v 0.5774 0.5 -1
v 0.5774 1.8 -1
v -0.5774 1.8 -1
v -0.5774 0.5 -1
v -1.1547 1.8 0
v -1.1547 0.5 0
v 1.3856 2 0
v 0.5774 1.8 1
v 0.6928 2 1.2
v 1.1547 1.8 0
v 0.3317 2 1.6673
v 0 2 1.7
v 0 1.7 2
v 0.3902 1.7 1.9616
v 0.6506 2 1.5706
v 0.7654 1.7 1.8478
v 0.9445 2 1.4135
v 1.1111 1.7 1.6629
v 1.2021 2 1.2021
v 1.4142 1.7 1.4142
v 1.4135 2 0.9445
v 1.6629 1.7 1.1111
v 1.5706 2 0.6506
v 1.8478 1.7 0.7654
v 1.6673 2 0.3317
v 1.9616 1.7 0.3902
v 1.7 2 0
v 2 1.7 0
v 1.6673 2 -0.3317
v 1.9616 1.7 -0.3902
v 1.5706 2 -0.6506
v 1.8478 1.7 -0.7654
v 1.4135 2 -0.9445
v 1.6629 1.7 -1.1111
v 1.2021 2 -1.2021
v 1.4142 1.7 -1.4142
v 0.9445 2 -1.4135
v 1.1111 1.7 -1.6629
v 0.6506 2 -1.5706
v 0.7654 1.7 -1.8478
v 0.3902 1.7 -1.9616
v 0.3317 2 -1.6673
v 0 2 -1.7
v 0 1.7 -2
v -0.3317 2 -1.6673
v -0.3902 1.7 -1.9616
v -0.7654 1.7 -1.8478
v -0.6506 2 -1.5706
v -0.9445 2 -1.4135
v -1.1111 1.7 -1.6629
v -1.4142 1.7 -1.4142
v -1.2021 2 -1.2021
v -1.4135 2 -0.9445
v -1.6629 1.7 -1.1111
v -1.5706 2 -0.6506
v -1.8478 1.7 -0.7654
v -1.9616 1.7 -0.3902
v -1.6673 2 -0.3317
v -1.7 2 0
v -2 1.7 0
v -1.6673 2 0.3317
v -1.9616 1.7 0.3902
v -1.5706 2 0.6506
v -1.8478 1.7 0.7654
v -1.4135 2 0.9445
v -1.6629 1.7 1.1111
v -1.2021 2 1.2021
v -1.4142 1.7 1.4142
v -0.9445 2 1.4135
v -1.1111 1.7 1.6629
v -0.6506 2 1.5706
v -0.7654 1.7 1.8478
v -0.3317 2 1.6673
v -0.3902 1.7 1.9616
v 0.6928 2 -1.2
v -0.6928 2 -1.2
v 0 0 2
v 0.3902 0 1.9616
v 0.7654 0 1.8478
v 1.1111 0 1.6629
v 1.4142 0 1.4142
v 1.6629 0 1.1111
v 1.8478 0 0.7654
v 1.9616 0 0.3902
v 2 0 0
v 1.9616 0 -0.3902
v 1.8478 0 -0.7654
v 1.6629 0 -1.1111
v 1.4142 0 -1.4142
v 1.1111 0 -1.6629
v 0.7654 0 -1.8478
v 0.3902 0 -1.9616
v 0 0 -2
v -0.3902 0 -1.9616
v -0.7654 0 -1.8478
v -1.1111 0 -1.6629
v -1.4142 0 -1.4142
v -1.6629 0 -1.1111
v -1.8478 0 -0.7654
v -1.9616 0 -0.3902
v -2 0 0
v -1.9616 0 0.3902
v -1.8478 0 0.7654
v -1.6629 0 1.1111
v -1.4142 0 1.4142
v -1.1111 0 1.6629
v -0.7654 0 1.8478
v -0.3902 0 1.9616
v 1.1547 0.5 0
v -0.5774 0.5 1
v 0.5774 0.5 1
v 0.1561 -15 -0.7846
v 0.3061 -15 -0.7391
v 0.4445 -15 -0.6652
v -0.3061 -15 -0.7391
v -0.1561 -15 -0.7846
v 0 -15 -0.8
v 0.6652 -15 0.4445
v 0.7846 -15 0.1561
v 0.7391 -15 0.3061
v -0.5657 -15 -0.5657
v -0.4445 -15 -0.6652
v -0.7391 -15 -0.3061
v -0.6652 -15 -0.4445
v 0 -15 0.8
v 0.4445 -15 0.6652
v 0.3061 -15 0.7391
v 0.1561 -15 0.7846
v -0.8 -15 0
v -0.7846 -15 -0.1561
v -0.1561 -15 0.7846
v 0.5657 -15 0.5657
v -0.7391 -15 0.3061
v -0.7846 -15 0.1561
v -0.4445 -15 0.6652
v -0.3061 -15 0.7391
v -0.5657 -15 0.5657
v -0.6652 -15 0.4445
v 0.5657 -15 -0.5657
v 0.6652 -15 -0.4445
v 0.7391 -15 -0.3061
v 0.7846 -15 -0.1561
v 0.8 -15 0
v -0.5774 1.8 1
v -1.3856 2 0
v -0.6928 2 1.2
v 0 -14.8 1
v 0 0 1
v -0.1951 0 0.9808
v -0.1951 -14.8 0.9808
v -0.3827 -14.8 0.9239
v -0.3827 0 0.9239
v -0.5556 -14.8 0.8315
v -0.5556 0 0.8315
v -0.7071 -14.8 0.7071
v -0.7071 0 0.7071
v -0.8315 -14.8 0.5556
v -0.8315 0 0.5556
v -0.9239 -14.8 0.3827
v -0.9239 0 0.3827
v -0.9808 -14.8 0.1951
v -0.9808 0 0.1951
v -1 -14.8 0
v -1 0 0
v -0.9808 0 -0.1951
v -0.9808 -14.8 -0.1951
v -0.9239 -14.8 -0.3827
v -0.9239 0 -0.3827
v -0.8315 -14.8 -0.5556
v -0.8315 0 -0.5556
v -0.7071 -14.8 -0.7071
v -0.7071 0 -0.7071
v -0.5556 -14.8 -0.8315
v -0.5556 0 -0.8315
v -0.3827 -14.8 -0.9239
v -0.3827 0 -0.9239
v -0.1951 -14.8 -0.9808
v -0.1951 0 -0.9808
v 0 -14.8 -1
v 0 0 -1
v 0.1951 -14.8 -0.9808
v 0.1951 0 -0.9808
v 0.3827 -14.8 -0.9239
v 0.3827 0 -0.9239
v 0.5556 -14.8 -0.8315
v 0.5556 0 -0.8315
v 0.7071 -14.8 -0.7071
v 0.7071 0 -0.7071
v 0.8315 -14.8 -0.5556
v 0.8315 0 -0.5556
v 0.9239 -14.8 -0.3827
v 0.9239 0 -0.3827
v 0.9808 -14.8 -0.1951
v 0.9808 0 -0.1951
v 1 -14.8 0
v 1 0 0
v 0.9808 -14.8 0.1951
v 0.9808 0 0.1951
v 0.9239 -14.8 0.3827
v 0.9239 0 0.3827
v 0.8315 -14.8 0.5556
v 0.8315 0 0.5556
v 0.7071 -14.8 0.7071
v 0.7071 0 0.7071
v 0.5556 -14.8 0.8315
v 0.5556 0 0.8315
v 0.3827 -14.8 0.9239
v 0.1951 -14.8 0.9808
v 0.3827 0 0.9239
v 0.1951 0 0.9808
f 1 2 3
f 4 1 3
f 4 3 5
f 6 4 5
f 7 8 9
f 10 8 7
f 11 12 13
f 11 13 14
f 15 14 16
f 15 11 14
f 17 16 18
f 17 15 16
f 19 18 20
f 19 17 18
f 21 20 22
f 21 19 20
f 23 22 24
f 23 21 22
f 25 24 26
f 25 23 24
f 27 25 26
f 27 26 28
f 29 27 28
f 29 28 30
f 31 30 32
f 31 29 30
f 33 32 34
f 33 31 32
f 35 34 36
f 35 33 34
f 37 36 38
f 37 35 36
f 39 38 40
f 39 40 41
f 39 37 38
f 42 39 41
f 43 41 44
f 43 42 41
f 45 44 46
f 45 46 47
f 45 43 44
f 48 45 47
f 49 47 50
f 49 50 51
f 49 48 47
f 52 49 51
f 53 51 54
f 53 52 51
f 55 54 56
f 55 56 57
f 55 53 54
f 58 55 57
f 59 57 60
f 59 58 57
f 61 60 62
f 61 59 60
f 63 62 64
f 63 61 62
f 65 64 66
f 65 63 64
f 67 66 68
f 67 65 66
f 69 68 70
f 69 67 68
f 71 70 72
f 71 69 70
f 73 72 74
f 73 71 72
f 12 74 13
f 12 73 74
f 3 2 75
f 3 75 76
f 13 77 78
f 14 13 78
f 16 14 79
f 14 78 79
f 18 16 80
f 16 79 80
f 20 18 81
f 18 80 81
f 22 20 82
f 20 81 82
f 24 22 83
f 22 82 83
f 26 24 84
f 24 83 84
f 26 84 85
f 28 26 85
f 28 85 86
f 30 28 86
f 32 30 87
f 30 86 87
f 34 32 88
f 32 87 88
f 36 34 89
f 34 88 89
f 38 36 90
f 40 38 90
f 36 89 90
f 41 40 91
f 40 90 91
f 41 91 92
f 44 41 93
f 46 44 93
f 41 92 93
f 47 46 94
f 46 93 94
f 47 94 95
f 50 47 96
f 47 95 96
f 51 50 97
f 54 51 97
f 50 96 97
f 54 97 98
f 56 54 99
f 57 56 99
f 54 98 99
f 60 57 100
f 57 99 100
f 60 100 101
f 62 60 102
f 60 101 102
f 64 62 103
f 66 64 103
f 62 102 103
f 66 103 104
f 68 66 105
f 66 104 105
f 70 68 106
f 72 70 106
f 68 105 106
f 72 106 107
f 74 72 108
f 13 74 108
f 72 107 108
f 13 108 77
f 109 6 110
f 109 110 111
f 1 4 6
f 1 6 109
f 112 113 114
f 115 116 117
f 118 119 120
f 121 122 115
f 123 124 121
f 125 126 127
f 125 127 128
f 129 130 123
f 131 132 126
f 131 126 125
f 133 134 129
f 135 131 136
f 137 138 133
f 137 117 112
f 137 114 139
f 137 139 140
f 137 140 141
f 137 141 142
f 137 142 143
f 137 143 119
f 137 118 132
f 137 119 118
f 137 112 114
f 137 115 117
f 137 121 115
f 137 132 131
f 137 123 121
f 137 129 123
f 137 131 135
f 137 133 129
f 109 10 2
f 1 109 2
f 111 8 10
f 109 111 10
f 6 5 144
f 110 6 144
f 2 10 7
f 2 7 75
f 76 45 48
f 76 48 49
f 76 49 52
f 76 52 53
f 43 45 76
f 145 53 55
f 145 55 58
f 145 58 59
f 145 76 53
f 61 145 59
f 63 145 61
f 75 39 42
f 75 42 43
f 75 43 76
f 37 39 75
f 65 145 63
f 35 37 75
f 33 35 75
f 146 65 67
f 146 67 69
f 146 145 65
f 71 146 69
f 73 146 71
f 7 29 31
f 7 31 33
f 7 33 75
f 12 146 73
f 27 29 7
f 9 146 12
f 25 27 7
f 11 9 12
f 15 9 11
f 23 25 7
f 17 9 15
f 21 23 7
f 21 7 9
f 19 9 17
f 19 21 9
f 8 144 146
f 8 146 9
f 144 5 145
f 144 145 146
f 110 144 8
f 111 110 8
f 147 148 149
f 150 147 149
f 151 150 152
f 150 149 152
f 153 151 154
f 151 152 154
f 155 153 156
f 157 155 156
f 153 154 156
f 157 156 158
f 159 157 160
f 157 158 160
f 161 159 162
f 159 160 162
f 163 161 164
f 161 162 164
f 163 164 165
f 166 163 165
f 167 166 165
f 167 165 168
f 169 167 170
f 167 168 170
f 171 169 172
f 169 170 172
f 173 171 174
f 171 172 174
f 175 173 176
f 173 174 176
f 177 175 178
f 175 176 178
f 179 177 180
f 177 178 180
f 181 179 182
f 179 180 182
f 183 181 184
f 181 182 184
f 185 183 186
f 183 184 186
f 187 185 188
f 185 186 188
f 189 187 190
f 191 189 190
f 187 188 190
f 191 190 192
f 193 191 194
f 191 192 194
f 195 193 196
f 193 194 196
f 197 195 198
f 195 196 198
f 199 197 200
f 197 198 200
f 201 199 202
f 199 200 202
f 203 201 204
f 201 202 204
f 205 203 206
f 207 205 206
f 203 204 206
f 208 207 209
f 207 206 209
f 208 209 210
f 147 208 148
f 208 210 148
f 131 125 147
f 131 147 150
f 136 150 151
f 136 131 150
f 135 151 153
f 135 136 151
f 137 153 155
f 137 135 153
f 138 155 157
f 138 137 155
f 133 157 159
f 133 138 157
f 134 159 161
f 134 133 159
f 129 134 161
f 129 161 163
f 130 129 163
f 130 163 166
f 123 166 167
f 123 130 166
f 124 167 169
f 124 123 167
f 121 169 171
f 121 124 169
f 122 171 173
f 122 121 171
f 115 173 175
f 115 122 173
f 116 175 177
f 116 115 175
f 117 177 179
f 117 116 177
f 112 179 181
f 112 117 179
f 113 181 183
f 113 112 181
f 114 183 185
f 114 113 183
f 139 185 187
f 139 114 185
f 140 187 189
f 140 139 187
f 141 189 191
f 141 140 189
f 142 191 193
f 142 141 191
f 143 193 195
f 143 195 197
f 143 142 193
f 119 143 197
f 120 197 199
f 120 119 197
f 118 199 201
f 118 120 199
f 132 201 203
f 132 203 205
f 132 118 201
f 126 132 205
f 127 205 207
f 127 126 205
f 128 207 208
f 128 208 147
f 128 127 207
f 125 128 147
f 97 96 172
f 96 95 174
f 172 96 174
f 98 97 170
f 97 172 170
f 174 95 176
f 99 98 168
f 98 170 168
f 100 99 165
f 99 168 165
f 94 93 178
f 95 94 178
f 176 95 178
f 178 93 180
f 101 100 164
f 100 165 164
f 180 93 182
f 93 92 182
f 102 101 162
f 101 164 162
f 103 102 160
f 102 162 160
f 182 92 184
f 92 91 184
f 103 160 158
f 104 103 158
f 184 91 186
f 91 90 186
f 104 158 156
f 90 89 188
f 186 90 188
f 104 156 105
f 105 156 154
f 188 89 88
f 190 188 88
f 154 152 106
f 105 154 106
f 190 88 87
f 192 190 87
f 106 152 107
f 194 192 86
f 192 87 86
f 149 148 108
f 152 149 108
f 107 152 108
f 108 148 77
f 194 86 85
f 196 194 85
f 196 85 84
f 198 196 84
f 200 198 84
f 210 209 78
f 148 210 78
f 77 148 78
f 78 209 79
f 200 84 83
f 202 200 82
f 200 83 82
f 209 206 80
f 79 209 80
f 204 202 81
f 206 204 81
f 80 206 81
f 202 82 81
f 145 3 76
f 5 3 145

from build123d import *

# Parameters (mm, degrees)
SKETCH1_R           = 2
BOSS_EXTRUDE1_DEPTH = 2
CHAMFER1_SIZE       = 0.3
CUT_EXTRUDE1_DEPTH  = 1.5
CHAMFER2_SIZE       = 0.2
SKETCH3_R           = 1
BOSS_EXTRUDE2_DEPTH = 15
CHAMFER3_SIZE       = 0.2


with BuildPart() as part:
    # Sketch1 → Boss-Extrude1 (new body)
    with BuildSketch(Plane(origin=(0, 0, 0), x_dir=(1, 0, 0), z_dir=(0, 1, 0))):
        with Locations(Location((0, 0, 0), (0, 0, 270))):  # turned: the seam where the file's is
            Circle(SKETCH1_R)
    extrude(amount=BOSS_EXTRUDE1_DEPTH)

    # Chamfer1
    chamfer1_edges = [part.edges().sort_by_distance(p)[0] for p in [
        (0, 2, -2),
    ]]
    chamfer(chamfer1_edges, length=CHAMFER1_SIZE)

    # Sketch2 → Cut-Extrude1 (cut)
    with BuildSketch(Plane(origin=(0, 2, 0), x_dir=(1, 0, 0), z_dir=(0, 1, 0))):
        Polygon((1.154700538, 0), (0.577350269, 1), (-0.577350269, 1), (-1.154700538, 0), (-0.577350269, -1), (0.577350269, -1), align=None)
    extrude(amount=-CUT_EXTRUDE1_DEPTH, mode=Mode.SUBTRACT)

    # Chamfer2
    chamfer2_edges = [part.edges().sort_by_distance(p)[0] for p in [
        (0.866025404, 2, 0.5),
        (0.866025404, 2, -0.5),
        (0, 2, -1),
        (-0.866025404, 2, -0.5),
        (-0.866025404, 2, 0.5),
        (0, 2, 1),
    ]]
    chamfer(chamfer2_edges, length=CHAMFER2_SIZE)

    # Sketch3 → Boss-Extrude2 (add)
    with BuildSketch(Plane.XZ):
        with Locations(Location((0, 0, 0), (0, 0, 90))):  # turned: the seam where the file's is
            Circle(SKETCH3_R)
    extrude(amount=BOSS_EXTRUDE2_DEPTH)

    # Chamfer3
    chamfer3_edges = [part.edges().sort_by_distance(p)[0] for p in [
        (0, -15, -1),
    ]]
    chamfer(chamfer3_edges, length=CHAMFER3_SIZE)


solid = part.part
